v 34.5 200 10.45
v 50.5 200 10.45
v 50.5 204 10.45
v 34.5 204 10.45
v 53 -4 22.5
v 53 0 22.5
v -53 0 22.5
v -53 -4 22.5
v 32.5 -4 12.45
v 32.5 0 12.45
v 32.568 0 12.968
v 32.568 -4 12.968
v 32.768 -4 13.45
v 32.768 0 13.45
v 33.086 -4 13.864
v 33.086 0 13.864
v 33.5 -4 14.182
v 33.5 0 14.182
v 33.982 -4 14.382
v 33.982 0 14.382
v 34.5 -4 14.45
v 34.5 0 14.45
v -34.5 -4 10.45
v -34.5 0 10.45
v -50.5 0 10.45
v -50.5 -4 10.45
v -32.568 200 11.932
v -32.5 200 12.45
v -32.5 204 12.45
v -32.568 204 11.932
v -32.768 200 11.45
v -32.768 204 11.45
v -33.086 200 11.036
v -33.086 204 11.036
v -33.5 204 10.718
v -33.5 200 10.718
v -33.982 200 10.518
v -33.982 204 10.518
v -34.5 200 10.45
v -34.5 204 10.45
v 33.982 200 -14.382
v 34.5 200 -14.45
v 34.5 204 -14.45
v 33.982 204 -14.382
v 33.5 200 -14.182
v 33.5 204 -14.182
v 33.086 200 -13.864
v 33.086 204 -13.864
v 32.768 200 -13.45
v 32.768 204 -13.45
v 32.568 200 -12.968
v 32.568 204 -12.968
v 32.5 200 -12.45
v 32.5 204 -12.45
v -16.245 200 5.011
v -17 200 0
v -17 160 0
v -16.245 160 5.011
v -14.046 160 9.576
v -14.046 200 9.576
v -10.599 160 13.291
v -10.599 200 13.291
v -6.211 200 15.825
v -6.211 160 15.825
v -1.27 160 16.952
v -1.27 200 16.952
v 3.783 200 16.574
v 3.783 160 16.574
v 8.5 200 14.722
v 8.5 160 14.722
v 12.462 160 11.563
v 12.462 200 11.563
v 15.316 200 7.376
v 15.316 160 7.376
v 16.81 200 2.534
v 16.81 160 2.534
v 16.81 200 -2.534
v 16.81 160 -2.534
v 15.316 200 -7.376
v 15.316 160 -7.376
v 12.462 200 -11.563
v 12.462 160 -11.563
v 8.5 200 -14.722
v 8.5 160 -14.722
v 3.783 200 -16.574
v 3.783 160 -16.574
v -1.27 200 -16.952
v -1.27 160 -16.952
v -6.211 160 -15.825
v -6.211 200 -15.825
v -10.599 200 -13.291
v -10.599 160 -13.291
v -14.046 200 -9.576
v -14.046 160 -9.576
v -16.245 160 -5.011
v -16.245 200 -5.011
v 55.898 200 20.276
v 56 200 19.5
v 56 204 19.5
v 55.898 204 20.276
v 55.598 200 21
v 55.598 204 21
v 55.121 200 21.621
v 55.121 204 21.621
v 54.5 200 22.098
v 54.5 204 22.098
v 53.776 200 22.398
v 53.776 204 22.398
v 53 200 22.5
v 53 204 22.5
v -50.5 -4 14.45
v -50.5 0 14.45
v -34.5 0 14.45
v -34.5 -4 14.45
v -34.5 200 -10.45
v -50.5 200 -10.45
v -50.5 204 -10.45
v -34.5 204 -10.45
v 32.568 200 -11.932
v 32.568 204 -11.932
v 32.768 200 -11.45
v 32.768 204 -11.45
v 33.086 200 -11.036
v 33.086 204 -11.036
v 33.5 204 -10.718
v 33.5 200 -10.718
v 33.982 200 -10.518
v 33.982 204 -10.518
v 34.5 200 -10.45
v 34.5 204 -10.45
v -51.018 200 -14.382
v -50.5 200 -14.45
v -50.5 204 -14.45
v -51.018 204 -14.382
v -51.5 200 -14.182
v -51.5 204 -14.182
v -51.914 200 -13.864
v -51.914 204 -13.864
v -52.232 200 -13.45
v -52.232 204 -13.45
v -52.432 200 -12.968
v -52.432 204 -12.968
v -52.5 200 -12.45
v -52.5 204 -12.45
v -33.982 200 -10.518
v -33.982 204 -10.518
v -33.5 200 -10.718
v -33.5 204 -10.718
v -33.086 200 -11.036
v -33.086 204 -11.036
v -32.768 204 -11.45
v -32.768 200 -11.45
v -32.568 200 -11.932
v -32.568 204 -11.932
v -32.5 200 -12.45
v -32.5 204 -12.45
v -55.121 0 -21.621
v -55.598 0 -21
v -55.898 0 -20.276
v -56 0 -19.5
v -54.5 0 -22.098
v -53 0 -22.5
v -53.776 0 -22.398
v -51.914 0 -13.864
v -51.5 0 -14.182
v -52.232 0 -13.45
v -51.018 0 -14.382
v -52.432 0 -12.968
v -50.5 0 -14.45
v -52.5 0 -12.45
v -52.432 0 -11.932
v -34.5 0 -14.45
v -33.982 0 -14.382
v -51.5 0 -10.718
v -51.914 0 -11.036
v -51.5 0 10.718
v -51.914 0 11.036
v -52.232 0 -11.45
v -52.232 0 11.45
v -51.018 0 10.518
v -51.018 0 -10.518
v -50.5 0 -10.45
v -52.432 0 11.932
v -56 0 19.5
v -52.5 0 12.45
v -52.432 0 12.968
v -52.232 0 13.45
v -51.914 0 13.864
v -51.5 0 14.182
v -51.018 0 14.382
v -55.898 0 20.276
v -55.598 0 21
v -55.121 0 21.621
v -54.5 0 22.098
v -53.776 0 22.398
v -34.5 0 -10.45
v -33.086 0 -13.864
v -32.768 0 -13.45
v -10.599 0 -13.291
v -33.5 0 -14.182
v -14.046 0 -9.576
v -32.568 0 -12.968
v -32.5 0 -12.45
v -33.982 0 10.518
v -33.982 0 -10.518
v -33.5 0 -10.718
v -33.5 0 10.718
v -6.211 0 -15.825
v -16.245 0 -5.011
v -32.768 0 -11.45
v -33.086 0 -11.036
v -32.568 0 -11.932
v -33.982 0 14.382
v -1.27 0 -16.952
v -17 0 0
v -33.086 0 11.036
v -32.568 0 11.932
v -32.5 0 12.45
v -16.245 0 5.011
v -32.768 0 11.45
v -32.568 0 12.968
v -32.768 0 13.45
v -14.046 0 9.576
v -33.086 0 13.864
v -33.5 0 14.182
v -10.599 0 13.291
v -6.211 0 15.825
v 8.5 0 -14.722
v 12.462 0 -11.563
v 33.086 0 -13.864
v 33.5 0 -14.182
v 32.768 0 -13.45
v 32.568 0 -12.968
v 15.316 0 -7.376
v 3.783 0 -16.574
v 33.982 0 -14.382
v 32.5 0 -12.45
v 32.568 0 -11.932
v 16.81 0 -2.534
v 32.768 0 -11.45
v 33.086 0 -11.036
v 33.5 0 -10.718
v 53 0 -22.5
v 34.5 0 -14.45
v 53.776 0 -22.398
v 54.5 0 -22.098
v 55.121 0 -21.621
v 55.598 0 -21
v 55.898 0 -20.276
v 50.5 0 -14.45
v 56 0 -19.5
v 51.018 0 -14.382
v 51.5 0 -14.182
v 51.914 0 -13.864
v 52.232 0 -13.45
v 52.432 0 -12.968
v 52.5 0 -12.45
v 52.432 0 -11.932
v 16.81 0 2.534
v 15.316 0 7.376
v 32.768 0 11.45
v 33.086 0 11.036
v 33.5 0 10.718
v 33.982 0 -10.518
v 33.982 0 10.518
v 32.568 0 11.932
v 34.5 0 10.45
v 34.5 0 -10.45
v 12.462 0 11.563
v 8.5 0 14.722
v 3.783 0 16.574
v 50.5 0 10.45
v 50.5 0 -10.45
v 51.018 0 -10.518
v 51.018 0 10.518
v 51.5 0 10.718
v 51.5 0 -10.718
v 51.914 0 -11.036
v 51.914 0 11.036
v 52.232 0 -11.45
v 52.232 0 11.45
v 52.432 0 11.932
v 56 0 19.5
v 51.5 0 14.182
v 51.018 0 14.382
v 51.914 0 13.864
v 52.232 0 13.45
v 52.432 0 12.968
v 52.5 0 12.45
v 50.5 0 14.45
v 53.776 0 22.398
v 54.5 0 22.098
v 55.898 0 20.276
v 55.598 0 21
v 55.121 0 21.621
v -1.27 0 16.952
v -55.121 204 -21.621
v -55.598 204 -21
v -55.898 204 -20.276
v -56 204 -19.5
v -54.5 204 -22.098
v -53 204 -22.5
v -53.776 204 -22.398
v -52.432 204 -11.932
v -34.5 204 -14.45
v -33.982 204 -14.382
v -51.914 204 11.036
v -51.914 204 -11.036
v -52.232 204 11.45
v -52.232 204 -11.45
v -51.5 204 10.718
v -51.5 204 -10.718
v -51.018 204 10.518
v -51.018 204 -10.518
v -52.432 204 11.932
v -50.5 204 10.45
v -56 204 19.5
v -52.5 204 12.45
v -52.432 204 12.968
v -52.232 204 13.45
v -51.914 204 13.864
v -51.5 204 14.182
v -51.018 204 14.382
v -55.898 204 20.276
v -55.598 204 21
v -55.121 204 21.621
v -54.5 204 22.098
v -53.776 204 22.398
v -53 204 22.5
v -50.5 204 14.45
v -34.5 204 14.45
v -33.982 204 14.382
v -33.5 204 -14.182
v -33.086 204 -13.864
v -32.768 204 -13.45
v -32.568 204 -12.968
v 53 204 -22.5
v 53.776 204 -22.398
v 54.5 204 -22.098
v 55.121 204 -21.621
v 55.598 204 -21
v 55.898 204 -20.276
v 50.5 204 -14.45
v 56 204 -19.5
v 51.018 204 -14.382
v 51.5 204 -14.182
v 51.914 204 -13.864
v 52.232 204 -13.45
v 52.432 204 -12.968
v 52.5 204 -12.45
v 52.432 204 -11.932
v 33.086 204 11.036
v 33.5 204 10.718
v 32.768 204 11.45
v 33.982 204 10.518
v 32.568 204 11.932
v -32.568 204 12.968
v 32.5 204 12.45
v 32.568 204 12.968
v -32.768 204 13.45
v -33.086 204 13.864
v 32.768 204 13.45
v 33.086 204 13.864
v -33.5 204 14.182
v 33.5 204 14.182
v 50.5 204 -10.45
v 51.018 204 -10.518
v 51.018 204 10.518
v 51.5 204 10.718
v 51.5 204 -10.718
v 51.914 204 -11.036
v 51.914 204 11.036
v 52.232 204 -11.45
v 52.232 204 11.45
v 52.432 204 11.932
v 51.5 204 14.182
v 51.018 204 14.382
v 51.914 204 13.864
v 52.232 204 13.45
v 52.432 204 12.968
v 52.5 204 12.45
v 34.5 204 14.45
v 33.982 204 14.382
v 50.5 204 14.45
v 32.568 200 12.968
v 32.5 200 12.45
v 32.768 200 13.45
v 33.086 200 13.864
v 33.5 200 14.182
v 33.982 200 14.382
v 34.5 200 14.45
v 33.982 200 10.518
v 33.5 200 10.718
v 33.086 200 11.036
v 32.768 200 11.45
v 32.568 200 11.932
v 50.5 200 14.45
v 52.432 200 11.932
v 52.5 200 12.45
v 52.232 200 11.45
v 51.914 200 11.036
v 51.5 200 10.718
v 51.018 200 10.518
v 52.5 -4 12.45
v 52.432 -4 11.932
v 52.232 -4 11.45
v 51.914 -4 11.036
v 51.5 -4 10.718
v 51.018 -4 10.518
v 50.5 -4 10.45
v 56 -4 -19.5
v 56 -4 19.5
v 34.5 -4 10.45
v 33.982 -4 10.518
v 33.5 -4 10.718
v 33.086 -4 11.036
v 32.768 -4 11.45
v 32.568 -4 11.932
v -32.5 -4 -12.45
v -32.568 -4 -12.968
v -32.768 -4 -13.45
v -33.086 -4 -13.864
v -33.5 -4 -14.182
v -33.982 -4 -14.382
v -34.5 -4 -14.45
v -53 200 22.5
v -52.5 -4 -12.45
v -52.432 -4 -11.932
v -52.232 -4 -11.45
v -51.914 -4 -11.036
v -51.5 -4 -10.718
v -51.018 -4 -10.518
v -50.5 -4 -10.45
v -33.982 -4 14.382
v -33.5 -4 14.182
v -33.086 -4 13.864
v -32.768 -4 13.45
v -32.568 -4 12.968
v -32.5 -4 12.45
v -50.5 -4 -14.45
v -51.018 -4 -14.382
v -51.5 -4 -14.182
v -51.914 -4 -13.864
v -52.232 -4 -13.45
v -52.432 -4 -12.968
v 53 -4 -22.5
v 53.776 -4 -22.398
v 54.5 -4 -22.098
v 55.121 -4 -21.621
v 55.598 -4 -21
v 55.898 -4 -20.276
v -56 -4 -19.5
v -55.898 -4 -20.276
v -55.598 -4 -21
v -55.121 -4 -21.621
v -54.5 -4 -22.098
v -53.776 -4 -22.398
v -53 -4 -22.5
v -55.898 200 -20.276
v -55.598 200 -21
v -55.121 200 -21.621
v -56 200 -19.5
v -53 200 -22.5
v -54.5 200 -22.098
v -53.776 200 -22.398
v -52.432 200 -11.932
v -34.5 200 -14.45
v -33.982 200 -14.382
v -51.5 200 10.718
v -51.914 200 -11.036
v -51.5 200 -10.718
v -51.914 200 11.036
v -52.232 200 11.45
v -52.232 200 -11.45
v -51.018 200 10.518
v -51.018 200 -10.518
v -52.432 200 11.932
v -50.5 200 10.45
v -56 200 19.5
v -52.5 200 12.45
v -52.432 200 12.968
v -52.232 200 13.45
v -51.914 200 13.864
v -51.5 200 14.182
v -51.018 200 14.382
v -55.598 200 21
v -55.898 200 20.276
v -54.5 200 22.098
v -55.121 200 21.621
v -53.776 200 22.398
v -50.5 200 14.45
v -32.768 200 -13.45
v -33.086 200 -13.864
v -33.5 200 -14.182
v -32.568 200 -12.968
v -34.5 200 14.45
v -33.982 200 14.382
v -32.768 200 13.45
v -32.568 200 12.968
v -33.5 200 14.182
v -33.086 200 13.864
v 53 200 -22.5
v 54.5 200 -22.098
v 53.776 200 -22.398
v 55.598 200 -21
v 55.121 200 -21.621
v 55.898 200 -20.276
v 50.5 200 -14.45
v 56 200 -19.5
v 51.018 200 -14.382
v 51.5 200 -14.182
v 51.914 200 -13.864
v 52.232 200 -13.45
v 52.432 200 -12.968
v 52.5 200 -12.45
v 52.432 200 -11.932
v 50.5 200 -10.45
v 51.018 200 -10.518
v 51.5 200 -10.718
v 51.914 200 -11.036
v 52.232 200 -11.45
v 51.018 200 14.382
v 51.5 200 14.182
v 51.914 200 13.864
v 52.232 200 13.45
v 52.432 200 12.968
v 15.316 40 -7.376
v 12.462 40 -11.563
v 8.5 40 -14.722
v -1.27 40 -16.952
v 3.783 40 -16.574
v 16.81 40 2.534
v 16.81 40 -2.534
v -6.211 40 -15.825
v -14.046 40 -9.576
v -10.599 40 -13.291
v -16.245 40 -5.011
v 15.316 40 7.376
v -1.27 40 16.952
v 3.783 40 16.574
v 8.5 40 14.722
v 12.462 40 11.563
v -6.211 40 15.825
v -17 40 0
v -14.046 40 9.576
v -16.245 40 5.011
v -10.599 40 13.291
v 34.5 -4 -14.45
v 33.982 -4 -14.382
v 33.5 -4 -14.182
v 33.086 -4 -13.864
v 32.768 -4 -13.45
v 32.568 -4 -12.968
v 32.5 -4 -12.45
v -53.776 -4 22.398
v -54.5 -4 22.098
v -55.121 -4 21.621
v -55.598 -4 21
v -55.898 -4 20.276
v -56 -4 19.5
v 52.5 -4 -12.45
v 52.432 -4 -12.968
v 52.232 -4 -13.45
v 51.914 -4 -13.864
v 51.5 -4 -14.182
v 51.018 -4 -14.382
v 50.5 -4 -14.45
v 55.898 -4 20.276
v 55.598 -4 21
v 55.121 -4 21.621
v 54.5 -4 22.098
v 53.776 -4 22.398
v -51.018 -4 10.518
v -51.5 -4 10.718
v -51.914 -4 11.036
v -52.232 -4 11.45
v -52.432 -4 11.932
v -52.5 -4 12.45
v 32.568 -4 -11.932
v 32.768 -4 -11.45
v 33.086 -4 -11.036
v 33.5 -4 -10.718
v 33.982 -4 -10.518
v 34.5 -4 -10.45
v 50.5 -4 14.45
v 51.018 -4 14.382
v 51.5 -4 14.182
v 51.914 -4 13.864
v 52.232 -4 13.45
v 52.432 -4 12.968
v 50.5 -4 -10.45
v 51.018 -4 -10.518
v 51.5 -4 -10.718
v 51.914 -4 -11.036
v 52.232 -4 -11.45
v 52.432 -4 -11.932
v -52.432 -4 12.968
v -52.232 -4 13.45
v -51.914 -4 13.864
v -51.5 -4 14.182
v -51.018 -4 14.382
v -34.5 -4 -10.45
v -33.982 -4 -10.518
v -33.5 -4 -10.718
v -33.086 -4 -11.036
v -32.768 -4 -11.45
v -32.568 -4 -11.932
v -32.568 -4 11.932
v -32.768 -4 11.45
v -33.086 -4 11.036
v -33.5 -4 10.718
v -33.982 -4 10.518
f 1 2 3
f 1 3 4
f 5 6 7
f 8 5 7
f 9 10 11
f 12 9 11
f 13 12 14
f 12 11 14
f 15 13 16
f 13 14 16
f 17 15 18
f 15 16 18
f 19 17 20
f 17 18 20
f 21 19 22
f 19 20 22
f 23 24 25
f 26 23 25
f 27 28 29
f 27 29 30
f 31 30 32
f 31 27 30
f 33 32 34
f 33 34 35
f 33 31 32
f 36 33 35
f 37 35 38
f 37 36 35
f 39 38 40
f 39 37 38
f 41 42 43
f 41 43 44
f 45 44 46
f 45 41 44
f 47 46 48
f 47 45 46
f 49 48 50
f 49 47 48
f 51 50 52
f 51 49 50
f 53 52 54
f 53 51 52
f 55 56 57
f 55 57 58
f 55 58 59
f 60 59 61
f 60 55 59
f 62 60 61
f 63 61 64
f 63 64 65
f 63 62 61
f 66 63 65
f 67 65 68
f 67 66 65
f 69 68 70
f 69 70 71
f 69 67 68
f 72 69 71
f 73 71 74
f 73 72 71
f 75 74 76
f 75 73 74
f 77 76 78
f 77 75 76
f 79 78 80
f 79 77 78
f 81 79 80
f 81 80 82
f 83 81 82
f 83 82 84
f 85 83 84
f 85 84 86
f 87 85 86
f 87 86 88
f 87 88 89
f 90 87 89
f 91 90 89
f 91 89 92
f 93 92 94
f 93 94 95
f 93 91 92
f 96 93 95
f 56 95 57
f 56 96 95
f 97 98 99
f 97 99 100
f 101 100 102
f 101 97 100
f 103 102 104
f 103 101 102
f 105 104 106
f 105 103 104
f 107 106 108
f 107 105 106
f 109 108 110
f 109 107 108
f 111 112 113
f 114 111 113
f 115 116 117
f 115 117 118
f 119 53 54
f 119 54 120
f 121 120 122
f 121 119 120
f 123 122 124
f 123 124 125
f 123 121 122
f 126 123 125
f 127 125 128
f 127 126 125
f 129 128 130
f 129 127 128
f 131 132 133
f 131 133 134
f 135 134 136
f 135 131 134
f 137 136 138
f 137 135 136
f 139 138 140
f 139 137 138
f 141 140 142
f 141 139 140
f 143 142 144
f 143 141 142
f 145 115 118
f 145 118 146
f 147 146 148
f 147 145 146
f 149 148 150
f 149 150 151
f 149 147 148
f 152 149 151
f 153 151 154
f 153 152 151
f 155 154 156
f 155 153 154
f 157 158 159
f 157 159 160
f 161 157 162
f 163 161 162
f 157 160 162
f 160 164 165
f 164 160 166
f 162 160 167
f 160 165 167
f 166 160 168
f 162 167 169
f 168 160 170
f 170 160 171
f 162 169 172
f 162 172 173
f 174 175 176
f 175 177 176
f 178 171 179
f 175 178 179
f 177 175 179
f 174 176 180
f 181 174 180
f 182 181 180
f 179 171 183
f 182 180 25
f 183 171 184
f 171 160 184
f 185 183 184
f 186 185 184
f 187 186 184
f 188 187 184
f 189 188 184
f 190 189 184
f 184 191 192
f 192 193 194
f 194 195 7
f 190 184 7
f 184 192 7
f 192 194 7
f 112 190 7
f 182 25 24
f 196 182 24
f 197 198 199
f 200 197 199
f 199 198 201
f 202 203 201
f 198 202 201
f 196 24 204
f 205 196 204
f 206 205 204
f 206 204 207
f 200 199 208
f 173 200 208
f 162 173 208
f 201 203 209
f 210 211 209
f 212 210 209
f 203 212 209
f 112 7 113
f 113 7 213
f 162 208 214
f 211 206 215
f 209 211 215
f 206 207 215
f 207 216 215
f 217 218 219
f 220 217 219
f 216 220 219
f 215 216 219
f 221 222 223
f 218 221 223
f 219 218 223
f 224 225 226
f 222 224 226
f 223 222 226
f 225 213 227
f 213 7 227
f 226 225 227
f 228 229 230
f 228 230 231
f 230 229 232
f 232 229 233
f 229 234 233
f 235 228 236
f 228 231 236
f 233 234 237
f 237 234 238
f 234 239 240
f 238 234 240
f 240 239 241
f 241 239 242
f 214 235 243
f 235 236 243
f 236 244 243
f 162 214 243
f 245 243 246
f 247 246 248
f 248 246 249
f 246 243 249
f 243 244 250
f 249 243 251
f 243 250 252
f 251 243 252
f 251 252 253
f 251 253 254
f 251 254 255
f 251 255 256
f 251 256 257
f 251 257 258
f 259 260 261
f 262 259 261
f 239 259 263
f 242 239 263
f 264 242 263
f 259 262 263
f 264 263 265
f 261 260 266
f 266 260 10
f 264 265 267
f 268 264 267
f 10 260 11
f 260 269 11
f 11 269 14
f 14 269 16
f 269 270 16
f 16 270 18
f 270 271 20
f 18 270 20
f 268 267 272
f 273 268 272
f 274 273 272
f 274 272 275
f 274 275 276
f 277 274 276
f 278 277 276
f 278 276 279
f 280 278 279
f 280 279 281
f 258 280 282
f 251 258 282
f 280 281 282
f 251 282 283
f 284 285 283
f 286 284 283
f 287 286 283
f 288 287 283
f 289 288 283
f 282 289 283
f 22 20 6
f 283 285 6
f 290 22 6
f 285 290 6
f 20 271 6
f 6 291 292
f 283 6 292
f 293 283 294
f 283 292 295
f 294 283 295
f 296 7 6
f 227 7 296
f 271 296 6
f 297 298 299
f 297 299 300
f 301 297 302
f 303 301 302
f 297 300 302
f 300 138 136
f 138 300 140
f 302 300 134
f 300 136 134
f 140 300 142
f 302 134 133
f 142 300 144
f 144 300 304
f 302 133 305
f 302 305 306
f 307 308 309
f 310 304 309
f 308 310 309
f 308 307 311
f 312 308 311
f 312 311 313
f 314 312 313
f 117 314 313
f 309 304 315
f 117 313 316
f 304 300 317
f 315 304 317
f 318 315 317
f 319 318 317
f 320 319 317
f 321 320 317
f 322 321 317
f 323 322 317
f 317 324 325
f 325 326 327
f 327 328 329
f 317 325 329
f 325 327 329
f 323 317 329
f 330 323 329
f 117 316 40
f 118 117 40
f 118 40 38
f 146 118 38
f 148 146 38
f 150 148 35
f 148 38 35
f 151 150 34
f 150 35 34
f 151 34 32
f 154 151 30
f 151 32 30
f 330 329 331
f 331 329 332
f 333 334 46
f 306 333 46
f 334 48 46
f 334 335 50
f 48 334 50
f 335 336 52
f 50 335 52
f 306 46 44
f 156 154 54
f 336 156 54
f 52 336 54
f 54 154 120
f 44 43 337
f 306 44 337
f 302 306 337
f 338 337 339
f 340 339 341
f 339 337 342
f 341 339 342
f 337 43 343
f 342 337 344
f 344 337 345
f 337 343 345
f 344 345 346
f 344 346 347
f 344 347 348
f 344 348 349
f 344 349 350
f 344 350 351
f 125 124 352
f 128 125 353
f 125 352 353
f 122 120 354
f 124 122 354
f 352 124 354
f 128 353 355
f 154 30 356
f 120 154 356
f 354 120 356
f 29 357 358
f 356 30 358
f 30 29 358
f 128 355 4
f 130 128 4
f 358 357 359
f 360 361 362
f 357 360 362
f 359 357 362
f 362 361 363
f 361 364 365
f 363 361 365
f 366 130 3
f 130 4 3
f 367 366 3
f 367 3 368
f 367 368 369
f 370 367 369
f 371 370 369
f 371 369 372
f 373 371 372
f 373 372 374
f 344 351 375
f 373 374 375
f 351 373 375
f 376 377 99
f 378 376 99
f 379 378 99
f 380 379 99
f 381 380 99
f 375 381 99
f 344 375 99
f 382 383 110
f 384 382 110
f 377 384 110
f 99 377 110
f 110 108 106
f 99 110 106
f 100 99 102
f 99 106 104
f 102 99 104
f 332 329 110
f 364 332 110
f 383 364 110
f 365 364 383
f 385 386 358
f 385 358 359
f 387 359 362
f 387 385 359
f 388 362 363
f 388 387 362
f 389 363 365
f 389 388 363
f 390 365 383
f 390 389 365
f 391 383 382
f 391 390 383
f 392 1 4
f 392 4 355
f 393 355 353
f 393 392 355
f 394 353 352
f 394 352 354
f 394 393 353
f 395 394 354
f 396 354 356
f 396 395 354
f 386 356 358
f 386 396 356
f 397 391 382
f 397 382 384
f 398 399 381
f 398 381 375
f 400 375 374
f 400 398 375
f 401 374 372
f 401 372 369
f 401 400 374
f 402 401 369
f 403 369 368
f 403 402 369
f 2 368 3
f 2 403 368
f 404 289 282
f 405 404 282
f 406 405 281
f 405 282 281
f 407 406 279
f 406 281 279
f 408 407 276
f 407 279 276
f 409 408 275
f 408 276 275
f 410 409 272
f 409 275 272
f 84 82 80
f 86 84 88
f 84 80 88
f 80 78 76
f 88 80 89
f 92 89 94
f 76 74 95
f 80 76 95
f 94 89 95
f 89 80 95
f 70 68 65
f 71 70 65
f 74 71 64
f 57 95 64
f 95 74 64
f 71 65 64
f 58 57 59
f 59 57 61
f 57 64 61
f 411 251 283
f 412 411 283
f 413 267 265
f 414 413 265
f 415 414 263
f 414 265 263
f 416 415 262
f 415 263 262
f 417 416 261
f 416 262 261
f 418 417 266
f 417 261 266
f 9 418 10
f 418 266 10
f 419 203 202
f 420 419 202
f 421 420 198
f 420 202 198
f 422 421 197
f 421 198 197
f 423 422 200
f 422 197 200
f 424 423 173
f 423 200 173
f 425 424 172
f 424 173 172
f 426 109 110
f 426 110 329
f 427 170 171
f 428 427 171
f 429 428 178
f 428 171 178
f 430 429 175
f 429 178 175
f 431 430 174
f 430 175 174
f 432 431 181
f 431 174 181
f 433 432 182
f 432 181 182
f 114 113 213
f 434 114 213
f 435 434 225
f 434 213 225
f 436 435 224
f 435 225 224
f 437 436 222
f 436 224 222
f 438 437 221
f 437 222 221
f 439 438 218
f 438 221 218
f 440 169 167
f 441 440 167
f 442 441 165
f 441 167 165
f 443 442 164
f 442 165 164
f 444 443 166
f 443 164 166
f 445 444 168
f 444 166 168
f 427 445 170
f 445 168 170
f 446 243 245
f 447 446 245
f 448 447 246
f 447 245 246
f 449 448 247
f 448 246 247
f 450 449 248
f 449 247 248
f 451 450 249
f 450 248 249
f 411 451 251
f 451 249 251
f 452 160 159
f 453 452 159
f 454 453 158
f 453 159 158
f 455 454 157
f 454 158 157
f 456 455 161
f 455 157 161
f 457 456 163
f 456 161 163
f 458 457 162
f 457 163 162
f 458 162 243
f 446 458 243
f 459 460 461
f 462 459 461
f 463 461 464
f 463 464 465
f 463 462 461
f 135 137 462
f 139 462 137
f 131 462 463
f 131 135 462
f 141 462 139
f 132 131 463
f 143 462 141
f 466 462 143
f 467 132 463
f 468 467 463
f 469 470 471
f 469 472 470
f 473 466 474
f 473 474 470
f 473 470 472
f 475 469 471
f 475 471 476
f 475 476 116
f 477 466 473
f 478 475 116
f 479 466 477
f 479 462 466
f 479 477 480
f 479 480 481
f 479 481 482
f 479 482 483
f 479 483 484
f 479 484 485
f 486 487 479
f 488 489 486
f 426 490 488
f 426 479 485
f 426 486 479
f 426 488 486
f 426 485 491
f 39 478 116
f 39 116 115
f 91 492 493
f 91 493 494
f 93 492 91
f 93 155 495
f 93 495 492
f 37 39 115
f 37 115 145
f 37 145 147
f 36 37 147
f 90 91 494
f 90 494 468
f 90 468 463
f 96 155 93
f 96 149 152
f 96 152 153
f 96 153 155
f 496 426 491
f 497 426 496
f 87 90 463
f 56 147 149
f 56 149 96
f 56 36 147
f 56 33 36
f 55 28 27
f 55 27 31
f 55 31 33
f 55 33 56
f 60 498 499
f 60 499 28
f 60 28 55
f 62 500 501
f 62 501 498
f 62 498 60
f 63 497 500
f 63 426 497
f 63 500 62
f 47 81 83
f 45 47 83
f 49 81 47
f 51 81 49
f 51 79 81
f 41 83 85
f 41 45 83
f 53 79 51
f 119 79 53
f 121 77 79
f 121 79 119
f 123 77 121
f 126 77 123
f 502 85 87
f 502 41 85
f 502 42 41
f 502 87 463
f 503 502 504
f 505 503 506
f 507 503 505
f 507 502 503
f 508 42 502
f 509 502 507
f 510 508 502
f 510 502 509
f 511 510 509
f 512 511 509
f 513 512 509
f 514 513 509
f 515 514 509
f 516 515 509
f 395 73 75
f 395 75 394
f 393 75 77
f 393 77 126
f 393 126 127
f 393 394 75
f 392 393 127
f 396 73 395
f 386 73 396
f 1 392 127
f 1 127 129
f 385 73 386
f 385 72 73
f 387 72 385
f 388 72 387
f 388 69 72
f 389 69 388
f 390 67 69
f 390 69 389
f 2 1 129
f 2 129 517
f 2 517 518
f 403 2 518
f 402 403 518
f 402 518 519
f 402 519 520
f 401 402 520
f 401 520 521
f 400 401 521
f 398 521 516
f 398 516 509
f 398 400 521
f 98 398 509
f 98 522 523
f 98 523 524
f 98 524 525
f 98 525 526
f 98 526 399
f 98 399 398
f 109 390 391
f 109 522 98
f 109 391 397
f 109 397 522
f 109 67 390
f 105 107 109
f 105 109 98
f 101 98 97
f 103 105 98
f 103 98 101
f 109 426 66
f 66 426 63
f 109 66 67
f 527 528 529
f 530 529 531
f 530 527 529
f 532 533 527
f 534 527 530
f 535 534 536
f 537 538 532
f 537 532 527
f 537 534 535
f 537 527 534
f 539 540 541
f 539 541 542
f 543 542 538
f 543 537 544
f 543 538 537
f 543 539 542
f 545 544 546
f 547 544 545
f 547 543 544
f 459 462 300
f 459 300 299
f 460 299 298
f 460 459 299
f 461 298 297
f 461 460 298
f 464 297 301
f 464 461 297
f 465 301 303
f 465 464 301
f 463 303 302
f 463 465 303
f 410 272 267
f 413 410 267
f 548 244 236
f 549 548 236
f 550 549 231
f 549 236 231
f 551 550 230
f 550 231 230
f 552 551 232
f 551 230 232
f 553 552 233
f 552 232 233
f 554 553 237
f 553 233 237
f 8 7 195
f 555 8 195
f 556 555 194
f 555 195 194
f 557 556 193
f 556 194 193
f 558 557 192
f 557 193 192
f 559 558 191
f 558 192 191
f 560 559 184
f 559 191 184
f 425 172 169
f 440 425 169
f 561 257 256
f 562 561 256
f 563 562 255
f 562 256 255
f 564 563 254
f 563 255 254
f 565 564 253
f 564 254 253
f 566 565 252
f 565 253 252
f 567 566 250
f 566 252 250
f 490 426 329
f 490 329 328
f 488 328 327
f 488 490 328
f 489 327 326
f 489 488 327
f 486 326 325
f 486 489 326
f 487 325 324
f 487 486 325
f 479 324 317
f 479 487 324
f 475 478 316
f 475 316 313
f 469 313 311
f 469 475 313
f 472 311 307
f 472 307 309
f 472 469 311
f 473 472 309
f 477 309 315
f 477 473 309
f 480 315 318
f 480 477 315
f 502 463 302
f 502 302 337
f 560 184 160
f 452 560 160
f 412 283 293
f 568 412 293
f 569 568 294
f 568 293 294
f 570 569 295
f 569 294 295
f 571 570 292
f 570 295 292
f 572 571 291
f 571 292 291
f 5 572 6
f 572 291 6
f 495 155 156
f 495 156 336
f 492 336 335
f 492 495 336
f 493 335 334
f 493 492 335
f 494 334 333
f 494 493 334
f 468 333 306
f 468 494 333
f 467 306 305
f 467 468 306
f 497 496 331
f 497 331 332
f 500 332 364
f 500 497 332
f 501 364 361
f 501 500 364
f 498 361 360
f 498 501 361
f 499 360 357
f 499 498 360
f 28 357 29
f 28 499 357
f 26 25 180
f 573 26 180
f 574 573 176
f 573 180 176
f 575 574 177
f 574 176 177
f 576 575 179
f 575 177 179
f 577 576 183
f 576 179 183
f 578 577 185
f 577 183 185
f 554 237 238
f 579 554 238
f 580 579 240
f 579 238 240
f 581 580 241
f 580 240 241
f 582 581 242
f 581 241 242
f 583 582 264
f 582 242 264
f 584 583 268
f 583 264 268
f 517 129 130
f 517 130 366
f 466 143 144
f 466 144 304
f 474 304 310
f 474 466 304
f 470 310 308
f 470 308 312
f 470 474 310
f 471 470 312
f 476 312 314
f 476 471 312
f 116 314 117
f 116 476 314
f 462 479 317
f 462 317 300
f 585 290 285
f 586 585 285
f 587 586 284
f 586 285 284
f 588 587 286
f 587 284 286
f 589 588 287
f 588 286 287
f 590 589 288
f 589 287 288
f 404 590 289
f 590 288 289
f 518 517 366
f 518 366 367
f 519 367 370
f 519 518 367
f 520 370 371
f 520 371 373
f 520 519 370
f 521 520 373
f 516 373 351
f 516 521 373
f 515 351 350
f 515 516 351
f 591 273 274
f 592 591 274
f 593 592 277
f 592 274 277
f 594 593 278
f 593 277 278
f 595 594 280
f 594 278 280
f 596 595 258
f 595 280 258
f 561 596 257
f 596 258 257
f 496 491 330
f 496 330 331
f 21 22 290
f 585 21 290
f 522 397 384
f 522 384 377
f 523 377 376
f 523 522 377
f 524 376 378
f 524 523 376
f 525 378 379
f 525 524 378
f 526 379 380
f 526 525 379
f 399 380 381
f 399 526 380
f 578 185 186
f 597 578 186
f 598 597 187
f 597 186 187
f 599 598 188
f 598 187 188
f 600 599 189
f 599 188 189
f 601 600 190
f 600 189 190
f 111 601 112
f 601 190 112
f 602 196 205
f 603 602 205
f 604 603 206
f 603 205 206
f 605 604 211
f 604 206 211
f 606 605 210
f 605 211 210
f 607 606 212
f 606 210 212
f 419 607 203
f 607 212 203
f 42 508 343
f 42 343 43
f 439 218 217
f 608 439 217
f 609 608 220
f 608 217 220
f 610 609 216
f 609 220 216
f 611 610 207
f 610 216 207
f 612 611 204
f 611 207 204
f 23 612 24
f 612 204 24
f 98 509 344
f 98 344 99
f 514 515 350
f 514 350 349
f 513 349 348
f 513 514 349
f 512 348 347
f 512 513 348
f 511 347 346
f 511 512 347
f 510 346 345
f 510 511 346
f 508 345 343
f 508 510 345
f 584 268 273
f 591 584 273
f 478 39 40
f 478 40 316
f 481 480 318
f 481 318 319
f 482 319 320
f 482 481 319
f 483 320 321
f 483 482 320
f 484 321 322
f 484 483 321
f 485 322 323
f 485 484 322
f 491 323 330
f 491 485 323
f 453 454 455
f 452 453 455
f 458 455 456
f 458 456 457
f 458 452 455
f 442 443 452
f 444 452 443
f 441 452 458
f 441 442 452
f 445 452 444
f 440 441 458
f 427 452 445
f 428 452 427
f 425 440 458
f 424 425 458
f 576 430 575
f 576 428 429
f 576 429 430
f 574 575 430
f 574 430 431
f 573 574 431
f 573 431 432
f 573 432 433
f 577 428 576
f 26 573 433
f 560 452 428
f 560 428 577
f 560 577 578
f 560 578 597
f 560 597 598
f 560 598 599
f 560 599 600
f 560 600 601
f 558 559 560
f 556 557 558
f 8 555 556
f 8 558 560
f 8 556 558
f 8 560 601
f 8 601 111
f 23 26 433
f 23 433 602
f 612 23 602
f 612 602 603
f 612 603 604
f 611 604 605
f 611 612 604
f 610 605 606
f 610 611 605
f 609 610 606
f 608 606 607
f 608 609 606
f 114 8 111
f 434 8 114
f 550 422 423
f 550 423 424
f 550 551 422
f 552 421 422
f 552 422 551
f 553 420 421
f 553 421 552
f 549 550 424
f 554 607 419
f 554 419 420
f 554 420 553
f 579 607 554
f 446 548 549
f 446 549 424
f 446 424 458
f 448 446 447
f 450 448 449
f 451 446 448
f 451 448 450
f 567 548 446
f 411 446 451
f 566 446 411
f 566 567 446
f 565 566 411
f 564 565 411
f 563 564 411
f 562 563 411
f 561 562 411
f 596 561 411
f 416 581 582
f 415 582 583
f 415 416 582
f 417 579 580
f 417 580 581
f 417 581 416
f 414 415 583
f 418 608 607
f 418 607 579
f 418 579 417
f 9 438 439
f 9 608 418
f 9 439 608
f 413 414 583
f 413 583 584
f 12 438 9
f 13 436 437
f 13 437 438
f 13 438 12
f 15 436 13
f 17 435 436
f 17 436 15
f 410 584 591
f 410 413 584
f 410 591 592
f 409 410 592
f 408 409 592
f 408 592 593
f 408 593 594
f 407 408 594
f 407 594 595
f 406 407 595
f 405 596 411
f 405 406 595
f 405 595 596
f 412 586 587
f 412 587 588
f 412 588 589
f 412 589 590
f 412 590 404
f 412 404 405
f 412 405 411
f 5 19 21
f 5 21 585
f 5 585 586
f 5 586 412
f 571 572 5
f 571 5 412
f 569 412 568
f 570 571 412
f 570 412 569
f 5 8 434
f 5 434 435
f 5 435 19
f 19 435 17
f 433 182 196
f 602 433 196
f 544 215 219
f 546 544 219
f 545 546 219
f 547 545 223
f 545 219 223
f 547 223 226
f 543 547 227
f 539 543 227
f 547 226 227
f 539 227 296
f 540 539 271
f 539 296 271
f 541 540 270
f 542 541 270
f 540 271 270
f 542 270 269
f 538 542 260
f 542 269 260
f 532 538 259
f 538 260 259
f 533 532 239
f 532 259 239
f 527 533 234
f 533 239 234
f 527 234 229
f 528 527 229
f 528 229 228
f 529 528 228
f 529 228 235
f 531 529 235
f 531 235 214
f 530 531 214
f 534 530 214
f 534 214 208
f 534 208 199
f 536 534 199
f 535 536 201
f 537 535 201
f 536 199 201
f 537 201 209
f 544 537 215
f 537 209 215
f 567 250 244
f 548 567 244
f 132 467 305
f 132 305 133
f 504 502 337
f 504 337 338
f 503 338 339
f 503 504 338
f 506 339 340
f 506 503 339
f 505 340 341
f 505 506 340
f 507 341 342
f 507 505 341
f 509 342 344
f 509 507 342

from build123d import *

# Parameters (mm, degrees)
F1_DEPTH = 4
F2_R     = 17
F3_DEPTH = 40


with BuildPart() as f1:
    # F0 (on Front) → F1 (new body)
    with BuildSketch(Plane.XZ):
        with BuildLine():
            ThreePointArc((56, 19.5), (55.12132, 21.62132), (53, 22.5))
            Line((53, 22.5), (-53, 22.5))
            ThreePointArc((-53, 22.5), (-55.12132, 21.62132), (-56, 19.5))
            Line((-56, 19.5), (-56, -19.5))
            ThreePointArc((-56, -19.5), (-55.12132, -21.62132), (-53, -22.5))
            Line((-53, -22.5), (53, -22.5))
            ThreePointArc((53, -22.5), (55.12132, -21.62132), (56, -19.5))
            Line((56, -19.5), (56, 19.5))
        make_face()
        with BuildLine():
            ThreePointArc((-34.5, -10.45), (-33.085786, -11.035786), (-32.5, -12.45))
            ThreePointArc((-32.5, -12.45), (-33.085786, -13.864214), (-34.5, -14.45))
            Line((-34.5, -14.45), (-50.5, -14.45))
            ThreePointArc((-50.5, -14.45), (-51.914214, -13.864214), (-52.5, -12.45))
            ThreePointArc((-52.5, -12.45), (-51.914214, -11.035786), (-50.5, -10.45))
            Line((-50.5, -10.45), (-34.5, -10.45))
        make_face(mode=Mode.SUBTRACT)
        with BuildLine():
            ThreePointArc((32.5, -12.45), (33.085786, -11.035786), (34.5, -10.45))
            Line((34.5, -10.45), (50.5, -10.45))
            ThreePointArc((50.5, -10.45), (51.914214, -11.035786), (52.5, -12.45))
            ThreePointArc((52.5, -12.45), (51.914214, -13.864214), (50.5, -14.45))
            Line((50.5, -14.45), (34.5, -14.45))
            ThreePointArc((34.5, -14.45), (33.085786, -13.864214), (32.5, -12.45))
        make_face(mode=Mode.SUBTRACT)
        with BuildLine():
            Line((-34.5, 10.45), (-50.5, 10.45))
            ThreePointArc((-50.5, 10.45), (-51.914214, 11.035786), (-52.5, 12.45))
            ThreePointArc((-52.5, 12.45), (-51.914214, 13.864214), (-50.5, 14.45))
            Line((-50.5, 14.45), (-34.5, 14.45))
            ThreePointArc((-34.5, 14.45), (-33.085786, 13.864214), (-32.5, 12.45))
            ThreePointArc((-32.5, 12.45), (-33.085786, 11.035786), (-34.5, 10.45))
        make_face(mode=Mode.SUBTRACT)
        with BuildLine():
            ThreePointArc((32.5, 12.45), (33.085786, 13.864214), (34.5, 14.45))
            Line((34.5, 14.45), (50.5, 14.45))
            ThreePointArc((50.5, 14.45), (51.914214, 13.864214), (52.5, 12.45))
            ThreePointArc((52.5, 12.45), (51.914214, 11.035786), (50.5, 10.45))
            Line((50.5, 10.45), (34.5, 10.45))
            ThreePointArc((34.5, 10.45), (33.085786, 11.035786), (32.5, 12.45))
        make_face(mode=Mode.SUBTRACT)
    extrude(amount=F1_DEPTH)

    # F2 (on face) → F3 (join)
    with BuildSketch(Plane(origin=(0, 0, 0), x_dir=(-1, 0, 0), z_dir=(0, 1, 0))):
        Circle(F2_R)
    extrude(amount=F3_DEPTH)


with BuildPart() as f5_1:
    # F5: instance of F1
    add(f1.part.mirror(Plane(origin=(0, 100, 0), x_dir=(1, 0, 0), z_dir=(0, 1, 0))))


solid = Compound([f1.part, f5_1.part])
